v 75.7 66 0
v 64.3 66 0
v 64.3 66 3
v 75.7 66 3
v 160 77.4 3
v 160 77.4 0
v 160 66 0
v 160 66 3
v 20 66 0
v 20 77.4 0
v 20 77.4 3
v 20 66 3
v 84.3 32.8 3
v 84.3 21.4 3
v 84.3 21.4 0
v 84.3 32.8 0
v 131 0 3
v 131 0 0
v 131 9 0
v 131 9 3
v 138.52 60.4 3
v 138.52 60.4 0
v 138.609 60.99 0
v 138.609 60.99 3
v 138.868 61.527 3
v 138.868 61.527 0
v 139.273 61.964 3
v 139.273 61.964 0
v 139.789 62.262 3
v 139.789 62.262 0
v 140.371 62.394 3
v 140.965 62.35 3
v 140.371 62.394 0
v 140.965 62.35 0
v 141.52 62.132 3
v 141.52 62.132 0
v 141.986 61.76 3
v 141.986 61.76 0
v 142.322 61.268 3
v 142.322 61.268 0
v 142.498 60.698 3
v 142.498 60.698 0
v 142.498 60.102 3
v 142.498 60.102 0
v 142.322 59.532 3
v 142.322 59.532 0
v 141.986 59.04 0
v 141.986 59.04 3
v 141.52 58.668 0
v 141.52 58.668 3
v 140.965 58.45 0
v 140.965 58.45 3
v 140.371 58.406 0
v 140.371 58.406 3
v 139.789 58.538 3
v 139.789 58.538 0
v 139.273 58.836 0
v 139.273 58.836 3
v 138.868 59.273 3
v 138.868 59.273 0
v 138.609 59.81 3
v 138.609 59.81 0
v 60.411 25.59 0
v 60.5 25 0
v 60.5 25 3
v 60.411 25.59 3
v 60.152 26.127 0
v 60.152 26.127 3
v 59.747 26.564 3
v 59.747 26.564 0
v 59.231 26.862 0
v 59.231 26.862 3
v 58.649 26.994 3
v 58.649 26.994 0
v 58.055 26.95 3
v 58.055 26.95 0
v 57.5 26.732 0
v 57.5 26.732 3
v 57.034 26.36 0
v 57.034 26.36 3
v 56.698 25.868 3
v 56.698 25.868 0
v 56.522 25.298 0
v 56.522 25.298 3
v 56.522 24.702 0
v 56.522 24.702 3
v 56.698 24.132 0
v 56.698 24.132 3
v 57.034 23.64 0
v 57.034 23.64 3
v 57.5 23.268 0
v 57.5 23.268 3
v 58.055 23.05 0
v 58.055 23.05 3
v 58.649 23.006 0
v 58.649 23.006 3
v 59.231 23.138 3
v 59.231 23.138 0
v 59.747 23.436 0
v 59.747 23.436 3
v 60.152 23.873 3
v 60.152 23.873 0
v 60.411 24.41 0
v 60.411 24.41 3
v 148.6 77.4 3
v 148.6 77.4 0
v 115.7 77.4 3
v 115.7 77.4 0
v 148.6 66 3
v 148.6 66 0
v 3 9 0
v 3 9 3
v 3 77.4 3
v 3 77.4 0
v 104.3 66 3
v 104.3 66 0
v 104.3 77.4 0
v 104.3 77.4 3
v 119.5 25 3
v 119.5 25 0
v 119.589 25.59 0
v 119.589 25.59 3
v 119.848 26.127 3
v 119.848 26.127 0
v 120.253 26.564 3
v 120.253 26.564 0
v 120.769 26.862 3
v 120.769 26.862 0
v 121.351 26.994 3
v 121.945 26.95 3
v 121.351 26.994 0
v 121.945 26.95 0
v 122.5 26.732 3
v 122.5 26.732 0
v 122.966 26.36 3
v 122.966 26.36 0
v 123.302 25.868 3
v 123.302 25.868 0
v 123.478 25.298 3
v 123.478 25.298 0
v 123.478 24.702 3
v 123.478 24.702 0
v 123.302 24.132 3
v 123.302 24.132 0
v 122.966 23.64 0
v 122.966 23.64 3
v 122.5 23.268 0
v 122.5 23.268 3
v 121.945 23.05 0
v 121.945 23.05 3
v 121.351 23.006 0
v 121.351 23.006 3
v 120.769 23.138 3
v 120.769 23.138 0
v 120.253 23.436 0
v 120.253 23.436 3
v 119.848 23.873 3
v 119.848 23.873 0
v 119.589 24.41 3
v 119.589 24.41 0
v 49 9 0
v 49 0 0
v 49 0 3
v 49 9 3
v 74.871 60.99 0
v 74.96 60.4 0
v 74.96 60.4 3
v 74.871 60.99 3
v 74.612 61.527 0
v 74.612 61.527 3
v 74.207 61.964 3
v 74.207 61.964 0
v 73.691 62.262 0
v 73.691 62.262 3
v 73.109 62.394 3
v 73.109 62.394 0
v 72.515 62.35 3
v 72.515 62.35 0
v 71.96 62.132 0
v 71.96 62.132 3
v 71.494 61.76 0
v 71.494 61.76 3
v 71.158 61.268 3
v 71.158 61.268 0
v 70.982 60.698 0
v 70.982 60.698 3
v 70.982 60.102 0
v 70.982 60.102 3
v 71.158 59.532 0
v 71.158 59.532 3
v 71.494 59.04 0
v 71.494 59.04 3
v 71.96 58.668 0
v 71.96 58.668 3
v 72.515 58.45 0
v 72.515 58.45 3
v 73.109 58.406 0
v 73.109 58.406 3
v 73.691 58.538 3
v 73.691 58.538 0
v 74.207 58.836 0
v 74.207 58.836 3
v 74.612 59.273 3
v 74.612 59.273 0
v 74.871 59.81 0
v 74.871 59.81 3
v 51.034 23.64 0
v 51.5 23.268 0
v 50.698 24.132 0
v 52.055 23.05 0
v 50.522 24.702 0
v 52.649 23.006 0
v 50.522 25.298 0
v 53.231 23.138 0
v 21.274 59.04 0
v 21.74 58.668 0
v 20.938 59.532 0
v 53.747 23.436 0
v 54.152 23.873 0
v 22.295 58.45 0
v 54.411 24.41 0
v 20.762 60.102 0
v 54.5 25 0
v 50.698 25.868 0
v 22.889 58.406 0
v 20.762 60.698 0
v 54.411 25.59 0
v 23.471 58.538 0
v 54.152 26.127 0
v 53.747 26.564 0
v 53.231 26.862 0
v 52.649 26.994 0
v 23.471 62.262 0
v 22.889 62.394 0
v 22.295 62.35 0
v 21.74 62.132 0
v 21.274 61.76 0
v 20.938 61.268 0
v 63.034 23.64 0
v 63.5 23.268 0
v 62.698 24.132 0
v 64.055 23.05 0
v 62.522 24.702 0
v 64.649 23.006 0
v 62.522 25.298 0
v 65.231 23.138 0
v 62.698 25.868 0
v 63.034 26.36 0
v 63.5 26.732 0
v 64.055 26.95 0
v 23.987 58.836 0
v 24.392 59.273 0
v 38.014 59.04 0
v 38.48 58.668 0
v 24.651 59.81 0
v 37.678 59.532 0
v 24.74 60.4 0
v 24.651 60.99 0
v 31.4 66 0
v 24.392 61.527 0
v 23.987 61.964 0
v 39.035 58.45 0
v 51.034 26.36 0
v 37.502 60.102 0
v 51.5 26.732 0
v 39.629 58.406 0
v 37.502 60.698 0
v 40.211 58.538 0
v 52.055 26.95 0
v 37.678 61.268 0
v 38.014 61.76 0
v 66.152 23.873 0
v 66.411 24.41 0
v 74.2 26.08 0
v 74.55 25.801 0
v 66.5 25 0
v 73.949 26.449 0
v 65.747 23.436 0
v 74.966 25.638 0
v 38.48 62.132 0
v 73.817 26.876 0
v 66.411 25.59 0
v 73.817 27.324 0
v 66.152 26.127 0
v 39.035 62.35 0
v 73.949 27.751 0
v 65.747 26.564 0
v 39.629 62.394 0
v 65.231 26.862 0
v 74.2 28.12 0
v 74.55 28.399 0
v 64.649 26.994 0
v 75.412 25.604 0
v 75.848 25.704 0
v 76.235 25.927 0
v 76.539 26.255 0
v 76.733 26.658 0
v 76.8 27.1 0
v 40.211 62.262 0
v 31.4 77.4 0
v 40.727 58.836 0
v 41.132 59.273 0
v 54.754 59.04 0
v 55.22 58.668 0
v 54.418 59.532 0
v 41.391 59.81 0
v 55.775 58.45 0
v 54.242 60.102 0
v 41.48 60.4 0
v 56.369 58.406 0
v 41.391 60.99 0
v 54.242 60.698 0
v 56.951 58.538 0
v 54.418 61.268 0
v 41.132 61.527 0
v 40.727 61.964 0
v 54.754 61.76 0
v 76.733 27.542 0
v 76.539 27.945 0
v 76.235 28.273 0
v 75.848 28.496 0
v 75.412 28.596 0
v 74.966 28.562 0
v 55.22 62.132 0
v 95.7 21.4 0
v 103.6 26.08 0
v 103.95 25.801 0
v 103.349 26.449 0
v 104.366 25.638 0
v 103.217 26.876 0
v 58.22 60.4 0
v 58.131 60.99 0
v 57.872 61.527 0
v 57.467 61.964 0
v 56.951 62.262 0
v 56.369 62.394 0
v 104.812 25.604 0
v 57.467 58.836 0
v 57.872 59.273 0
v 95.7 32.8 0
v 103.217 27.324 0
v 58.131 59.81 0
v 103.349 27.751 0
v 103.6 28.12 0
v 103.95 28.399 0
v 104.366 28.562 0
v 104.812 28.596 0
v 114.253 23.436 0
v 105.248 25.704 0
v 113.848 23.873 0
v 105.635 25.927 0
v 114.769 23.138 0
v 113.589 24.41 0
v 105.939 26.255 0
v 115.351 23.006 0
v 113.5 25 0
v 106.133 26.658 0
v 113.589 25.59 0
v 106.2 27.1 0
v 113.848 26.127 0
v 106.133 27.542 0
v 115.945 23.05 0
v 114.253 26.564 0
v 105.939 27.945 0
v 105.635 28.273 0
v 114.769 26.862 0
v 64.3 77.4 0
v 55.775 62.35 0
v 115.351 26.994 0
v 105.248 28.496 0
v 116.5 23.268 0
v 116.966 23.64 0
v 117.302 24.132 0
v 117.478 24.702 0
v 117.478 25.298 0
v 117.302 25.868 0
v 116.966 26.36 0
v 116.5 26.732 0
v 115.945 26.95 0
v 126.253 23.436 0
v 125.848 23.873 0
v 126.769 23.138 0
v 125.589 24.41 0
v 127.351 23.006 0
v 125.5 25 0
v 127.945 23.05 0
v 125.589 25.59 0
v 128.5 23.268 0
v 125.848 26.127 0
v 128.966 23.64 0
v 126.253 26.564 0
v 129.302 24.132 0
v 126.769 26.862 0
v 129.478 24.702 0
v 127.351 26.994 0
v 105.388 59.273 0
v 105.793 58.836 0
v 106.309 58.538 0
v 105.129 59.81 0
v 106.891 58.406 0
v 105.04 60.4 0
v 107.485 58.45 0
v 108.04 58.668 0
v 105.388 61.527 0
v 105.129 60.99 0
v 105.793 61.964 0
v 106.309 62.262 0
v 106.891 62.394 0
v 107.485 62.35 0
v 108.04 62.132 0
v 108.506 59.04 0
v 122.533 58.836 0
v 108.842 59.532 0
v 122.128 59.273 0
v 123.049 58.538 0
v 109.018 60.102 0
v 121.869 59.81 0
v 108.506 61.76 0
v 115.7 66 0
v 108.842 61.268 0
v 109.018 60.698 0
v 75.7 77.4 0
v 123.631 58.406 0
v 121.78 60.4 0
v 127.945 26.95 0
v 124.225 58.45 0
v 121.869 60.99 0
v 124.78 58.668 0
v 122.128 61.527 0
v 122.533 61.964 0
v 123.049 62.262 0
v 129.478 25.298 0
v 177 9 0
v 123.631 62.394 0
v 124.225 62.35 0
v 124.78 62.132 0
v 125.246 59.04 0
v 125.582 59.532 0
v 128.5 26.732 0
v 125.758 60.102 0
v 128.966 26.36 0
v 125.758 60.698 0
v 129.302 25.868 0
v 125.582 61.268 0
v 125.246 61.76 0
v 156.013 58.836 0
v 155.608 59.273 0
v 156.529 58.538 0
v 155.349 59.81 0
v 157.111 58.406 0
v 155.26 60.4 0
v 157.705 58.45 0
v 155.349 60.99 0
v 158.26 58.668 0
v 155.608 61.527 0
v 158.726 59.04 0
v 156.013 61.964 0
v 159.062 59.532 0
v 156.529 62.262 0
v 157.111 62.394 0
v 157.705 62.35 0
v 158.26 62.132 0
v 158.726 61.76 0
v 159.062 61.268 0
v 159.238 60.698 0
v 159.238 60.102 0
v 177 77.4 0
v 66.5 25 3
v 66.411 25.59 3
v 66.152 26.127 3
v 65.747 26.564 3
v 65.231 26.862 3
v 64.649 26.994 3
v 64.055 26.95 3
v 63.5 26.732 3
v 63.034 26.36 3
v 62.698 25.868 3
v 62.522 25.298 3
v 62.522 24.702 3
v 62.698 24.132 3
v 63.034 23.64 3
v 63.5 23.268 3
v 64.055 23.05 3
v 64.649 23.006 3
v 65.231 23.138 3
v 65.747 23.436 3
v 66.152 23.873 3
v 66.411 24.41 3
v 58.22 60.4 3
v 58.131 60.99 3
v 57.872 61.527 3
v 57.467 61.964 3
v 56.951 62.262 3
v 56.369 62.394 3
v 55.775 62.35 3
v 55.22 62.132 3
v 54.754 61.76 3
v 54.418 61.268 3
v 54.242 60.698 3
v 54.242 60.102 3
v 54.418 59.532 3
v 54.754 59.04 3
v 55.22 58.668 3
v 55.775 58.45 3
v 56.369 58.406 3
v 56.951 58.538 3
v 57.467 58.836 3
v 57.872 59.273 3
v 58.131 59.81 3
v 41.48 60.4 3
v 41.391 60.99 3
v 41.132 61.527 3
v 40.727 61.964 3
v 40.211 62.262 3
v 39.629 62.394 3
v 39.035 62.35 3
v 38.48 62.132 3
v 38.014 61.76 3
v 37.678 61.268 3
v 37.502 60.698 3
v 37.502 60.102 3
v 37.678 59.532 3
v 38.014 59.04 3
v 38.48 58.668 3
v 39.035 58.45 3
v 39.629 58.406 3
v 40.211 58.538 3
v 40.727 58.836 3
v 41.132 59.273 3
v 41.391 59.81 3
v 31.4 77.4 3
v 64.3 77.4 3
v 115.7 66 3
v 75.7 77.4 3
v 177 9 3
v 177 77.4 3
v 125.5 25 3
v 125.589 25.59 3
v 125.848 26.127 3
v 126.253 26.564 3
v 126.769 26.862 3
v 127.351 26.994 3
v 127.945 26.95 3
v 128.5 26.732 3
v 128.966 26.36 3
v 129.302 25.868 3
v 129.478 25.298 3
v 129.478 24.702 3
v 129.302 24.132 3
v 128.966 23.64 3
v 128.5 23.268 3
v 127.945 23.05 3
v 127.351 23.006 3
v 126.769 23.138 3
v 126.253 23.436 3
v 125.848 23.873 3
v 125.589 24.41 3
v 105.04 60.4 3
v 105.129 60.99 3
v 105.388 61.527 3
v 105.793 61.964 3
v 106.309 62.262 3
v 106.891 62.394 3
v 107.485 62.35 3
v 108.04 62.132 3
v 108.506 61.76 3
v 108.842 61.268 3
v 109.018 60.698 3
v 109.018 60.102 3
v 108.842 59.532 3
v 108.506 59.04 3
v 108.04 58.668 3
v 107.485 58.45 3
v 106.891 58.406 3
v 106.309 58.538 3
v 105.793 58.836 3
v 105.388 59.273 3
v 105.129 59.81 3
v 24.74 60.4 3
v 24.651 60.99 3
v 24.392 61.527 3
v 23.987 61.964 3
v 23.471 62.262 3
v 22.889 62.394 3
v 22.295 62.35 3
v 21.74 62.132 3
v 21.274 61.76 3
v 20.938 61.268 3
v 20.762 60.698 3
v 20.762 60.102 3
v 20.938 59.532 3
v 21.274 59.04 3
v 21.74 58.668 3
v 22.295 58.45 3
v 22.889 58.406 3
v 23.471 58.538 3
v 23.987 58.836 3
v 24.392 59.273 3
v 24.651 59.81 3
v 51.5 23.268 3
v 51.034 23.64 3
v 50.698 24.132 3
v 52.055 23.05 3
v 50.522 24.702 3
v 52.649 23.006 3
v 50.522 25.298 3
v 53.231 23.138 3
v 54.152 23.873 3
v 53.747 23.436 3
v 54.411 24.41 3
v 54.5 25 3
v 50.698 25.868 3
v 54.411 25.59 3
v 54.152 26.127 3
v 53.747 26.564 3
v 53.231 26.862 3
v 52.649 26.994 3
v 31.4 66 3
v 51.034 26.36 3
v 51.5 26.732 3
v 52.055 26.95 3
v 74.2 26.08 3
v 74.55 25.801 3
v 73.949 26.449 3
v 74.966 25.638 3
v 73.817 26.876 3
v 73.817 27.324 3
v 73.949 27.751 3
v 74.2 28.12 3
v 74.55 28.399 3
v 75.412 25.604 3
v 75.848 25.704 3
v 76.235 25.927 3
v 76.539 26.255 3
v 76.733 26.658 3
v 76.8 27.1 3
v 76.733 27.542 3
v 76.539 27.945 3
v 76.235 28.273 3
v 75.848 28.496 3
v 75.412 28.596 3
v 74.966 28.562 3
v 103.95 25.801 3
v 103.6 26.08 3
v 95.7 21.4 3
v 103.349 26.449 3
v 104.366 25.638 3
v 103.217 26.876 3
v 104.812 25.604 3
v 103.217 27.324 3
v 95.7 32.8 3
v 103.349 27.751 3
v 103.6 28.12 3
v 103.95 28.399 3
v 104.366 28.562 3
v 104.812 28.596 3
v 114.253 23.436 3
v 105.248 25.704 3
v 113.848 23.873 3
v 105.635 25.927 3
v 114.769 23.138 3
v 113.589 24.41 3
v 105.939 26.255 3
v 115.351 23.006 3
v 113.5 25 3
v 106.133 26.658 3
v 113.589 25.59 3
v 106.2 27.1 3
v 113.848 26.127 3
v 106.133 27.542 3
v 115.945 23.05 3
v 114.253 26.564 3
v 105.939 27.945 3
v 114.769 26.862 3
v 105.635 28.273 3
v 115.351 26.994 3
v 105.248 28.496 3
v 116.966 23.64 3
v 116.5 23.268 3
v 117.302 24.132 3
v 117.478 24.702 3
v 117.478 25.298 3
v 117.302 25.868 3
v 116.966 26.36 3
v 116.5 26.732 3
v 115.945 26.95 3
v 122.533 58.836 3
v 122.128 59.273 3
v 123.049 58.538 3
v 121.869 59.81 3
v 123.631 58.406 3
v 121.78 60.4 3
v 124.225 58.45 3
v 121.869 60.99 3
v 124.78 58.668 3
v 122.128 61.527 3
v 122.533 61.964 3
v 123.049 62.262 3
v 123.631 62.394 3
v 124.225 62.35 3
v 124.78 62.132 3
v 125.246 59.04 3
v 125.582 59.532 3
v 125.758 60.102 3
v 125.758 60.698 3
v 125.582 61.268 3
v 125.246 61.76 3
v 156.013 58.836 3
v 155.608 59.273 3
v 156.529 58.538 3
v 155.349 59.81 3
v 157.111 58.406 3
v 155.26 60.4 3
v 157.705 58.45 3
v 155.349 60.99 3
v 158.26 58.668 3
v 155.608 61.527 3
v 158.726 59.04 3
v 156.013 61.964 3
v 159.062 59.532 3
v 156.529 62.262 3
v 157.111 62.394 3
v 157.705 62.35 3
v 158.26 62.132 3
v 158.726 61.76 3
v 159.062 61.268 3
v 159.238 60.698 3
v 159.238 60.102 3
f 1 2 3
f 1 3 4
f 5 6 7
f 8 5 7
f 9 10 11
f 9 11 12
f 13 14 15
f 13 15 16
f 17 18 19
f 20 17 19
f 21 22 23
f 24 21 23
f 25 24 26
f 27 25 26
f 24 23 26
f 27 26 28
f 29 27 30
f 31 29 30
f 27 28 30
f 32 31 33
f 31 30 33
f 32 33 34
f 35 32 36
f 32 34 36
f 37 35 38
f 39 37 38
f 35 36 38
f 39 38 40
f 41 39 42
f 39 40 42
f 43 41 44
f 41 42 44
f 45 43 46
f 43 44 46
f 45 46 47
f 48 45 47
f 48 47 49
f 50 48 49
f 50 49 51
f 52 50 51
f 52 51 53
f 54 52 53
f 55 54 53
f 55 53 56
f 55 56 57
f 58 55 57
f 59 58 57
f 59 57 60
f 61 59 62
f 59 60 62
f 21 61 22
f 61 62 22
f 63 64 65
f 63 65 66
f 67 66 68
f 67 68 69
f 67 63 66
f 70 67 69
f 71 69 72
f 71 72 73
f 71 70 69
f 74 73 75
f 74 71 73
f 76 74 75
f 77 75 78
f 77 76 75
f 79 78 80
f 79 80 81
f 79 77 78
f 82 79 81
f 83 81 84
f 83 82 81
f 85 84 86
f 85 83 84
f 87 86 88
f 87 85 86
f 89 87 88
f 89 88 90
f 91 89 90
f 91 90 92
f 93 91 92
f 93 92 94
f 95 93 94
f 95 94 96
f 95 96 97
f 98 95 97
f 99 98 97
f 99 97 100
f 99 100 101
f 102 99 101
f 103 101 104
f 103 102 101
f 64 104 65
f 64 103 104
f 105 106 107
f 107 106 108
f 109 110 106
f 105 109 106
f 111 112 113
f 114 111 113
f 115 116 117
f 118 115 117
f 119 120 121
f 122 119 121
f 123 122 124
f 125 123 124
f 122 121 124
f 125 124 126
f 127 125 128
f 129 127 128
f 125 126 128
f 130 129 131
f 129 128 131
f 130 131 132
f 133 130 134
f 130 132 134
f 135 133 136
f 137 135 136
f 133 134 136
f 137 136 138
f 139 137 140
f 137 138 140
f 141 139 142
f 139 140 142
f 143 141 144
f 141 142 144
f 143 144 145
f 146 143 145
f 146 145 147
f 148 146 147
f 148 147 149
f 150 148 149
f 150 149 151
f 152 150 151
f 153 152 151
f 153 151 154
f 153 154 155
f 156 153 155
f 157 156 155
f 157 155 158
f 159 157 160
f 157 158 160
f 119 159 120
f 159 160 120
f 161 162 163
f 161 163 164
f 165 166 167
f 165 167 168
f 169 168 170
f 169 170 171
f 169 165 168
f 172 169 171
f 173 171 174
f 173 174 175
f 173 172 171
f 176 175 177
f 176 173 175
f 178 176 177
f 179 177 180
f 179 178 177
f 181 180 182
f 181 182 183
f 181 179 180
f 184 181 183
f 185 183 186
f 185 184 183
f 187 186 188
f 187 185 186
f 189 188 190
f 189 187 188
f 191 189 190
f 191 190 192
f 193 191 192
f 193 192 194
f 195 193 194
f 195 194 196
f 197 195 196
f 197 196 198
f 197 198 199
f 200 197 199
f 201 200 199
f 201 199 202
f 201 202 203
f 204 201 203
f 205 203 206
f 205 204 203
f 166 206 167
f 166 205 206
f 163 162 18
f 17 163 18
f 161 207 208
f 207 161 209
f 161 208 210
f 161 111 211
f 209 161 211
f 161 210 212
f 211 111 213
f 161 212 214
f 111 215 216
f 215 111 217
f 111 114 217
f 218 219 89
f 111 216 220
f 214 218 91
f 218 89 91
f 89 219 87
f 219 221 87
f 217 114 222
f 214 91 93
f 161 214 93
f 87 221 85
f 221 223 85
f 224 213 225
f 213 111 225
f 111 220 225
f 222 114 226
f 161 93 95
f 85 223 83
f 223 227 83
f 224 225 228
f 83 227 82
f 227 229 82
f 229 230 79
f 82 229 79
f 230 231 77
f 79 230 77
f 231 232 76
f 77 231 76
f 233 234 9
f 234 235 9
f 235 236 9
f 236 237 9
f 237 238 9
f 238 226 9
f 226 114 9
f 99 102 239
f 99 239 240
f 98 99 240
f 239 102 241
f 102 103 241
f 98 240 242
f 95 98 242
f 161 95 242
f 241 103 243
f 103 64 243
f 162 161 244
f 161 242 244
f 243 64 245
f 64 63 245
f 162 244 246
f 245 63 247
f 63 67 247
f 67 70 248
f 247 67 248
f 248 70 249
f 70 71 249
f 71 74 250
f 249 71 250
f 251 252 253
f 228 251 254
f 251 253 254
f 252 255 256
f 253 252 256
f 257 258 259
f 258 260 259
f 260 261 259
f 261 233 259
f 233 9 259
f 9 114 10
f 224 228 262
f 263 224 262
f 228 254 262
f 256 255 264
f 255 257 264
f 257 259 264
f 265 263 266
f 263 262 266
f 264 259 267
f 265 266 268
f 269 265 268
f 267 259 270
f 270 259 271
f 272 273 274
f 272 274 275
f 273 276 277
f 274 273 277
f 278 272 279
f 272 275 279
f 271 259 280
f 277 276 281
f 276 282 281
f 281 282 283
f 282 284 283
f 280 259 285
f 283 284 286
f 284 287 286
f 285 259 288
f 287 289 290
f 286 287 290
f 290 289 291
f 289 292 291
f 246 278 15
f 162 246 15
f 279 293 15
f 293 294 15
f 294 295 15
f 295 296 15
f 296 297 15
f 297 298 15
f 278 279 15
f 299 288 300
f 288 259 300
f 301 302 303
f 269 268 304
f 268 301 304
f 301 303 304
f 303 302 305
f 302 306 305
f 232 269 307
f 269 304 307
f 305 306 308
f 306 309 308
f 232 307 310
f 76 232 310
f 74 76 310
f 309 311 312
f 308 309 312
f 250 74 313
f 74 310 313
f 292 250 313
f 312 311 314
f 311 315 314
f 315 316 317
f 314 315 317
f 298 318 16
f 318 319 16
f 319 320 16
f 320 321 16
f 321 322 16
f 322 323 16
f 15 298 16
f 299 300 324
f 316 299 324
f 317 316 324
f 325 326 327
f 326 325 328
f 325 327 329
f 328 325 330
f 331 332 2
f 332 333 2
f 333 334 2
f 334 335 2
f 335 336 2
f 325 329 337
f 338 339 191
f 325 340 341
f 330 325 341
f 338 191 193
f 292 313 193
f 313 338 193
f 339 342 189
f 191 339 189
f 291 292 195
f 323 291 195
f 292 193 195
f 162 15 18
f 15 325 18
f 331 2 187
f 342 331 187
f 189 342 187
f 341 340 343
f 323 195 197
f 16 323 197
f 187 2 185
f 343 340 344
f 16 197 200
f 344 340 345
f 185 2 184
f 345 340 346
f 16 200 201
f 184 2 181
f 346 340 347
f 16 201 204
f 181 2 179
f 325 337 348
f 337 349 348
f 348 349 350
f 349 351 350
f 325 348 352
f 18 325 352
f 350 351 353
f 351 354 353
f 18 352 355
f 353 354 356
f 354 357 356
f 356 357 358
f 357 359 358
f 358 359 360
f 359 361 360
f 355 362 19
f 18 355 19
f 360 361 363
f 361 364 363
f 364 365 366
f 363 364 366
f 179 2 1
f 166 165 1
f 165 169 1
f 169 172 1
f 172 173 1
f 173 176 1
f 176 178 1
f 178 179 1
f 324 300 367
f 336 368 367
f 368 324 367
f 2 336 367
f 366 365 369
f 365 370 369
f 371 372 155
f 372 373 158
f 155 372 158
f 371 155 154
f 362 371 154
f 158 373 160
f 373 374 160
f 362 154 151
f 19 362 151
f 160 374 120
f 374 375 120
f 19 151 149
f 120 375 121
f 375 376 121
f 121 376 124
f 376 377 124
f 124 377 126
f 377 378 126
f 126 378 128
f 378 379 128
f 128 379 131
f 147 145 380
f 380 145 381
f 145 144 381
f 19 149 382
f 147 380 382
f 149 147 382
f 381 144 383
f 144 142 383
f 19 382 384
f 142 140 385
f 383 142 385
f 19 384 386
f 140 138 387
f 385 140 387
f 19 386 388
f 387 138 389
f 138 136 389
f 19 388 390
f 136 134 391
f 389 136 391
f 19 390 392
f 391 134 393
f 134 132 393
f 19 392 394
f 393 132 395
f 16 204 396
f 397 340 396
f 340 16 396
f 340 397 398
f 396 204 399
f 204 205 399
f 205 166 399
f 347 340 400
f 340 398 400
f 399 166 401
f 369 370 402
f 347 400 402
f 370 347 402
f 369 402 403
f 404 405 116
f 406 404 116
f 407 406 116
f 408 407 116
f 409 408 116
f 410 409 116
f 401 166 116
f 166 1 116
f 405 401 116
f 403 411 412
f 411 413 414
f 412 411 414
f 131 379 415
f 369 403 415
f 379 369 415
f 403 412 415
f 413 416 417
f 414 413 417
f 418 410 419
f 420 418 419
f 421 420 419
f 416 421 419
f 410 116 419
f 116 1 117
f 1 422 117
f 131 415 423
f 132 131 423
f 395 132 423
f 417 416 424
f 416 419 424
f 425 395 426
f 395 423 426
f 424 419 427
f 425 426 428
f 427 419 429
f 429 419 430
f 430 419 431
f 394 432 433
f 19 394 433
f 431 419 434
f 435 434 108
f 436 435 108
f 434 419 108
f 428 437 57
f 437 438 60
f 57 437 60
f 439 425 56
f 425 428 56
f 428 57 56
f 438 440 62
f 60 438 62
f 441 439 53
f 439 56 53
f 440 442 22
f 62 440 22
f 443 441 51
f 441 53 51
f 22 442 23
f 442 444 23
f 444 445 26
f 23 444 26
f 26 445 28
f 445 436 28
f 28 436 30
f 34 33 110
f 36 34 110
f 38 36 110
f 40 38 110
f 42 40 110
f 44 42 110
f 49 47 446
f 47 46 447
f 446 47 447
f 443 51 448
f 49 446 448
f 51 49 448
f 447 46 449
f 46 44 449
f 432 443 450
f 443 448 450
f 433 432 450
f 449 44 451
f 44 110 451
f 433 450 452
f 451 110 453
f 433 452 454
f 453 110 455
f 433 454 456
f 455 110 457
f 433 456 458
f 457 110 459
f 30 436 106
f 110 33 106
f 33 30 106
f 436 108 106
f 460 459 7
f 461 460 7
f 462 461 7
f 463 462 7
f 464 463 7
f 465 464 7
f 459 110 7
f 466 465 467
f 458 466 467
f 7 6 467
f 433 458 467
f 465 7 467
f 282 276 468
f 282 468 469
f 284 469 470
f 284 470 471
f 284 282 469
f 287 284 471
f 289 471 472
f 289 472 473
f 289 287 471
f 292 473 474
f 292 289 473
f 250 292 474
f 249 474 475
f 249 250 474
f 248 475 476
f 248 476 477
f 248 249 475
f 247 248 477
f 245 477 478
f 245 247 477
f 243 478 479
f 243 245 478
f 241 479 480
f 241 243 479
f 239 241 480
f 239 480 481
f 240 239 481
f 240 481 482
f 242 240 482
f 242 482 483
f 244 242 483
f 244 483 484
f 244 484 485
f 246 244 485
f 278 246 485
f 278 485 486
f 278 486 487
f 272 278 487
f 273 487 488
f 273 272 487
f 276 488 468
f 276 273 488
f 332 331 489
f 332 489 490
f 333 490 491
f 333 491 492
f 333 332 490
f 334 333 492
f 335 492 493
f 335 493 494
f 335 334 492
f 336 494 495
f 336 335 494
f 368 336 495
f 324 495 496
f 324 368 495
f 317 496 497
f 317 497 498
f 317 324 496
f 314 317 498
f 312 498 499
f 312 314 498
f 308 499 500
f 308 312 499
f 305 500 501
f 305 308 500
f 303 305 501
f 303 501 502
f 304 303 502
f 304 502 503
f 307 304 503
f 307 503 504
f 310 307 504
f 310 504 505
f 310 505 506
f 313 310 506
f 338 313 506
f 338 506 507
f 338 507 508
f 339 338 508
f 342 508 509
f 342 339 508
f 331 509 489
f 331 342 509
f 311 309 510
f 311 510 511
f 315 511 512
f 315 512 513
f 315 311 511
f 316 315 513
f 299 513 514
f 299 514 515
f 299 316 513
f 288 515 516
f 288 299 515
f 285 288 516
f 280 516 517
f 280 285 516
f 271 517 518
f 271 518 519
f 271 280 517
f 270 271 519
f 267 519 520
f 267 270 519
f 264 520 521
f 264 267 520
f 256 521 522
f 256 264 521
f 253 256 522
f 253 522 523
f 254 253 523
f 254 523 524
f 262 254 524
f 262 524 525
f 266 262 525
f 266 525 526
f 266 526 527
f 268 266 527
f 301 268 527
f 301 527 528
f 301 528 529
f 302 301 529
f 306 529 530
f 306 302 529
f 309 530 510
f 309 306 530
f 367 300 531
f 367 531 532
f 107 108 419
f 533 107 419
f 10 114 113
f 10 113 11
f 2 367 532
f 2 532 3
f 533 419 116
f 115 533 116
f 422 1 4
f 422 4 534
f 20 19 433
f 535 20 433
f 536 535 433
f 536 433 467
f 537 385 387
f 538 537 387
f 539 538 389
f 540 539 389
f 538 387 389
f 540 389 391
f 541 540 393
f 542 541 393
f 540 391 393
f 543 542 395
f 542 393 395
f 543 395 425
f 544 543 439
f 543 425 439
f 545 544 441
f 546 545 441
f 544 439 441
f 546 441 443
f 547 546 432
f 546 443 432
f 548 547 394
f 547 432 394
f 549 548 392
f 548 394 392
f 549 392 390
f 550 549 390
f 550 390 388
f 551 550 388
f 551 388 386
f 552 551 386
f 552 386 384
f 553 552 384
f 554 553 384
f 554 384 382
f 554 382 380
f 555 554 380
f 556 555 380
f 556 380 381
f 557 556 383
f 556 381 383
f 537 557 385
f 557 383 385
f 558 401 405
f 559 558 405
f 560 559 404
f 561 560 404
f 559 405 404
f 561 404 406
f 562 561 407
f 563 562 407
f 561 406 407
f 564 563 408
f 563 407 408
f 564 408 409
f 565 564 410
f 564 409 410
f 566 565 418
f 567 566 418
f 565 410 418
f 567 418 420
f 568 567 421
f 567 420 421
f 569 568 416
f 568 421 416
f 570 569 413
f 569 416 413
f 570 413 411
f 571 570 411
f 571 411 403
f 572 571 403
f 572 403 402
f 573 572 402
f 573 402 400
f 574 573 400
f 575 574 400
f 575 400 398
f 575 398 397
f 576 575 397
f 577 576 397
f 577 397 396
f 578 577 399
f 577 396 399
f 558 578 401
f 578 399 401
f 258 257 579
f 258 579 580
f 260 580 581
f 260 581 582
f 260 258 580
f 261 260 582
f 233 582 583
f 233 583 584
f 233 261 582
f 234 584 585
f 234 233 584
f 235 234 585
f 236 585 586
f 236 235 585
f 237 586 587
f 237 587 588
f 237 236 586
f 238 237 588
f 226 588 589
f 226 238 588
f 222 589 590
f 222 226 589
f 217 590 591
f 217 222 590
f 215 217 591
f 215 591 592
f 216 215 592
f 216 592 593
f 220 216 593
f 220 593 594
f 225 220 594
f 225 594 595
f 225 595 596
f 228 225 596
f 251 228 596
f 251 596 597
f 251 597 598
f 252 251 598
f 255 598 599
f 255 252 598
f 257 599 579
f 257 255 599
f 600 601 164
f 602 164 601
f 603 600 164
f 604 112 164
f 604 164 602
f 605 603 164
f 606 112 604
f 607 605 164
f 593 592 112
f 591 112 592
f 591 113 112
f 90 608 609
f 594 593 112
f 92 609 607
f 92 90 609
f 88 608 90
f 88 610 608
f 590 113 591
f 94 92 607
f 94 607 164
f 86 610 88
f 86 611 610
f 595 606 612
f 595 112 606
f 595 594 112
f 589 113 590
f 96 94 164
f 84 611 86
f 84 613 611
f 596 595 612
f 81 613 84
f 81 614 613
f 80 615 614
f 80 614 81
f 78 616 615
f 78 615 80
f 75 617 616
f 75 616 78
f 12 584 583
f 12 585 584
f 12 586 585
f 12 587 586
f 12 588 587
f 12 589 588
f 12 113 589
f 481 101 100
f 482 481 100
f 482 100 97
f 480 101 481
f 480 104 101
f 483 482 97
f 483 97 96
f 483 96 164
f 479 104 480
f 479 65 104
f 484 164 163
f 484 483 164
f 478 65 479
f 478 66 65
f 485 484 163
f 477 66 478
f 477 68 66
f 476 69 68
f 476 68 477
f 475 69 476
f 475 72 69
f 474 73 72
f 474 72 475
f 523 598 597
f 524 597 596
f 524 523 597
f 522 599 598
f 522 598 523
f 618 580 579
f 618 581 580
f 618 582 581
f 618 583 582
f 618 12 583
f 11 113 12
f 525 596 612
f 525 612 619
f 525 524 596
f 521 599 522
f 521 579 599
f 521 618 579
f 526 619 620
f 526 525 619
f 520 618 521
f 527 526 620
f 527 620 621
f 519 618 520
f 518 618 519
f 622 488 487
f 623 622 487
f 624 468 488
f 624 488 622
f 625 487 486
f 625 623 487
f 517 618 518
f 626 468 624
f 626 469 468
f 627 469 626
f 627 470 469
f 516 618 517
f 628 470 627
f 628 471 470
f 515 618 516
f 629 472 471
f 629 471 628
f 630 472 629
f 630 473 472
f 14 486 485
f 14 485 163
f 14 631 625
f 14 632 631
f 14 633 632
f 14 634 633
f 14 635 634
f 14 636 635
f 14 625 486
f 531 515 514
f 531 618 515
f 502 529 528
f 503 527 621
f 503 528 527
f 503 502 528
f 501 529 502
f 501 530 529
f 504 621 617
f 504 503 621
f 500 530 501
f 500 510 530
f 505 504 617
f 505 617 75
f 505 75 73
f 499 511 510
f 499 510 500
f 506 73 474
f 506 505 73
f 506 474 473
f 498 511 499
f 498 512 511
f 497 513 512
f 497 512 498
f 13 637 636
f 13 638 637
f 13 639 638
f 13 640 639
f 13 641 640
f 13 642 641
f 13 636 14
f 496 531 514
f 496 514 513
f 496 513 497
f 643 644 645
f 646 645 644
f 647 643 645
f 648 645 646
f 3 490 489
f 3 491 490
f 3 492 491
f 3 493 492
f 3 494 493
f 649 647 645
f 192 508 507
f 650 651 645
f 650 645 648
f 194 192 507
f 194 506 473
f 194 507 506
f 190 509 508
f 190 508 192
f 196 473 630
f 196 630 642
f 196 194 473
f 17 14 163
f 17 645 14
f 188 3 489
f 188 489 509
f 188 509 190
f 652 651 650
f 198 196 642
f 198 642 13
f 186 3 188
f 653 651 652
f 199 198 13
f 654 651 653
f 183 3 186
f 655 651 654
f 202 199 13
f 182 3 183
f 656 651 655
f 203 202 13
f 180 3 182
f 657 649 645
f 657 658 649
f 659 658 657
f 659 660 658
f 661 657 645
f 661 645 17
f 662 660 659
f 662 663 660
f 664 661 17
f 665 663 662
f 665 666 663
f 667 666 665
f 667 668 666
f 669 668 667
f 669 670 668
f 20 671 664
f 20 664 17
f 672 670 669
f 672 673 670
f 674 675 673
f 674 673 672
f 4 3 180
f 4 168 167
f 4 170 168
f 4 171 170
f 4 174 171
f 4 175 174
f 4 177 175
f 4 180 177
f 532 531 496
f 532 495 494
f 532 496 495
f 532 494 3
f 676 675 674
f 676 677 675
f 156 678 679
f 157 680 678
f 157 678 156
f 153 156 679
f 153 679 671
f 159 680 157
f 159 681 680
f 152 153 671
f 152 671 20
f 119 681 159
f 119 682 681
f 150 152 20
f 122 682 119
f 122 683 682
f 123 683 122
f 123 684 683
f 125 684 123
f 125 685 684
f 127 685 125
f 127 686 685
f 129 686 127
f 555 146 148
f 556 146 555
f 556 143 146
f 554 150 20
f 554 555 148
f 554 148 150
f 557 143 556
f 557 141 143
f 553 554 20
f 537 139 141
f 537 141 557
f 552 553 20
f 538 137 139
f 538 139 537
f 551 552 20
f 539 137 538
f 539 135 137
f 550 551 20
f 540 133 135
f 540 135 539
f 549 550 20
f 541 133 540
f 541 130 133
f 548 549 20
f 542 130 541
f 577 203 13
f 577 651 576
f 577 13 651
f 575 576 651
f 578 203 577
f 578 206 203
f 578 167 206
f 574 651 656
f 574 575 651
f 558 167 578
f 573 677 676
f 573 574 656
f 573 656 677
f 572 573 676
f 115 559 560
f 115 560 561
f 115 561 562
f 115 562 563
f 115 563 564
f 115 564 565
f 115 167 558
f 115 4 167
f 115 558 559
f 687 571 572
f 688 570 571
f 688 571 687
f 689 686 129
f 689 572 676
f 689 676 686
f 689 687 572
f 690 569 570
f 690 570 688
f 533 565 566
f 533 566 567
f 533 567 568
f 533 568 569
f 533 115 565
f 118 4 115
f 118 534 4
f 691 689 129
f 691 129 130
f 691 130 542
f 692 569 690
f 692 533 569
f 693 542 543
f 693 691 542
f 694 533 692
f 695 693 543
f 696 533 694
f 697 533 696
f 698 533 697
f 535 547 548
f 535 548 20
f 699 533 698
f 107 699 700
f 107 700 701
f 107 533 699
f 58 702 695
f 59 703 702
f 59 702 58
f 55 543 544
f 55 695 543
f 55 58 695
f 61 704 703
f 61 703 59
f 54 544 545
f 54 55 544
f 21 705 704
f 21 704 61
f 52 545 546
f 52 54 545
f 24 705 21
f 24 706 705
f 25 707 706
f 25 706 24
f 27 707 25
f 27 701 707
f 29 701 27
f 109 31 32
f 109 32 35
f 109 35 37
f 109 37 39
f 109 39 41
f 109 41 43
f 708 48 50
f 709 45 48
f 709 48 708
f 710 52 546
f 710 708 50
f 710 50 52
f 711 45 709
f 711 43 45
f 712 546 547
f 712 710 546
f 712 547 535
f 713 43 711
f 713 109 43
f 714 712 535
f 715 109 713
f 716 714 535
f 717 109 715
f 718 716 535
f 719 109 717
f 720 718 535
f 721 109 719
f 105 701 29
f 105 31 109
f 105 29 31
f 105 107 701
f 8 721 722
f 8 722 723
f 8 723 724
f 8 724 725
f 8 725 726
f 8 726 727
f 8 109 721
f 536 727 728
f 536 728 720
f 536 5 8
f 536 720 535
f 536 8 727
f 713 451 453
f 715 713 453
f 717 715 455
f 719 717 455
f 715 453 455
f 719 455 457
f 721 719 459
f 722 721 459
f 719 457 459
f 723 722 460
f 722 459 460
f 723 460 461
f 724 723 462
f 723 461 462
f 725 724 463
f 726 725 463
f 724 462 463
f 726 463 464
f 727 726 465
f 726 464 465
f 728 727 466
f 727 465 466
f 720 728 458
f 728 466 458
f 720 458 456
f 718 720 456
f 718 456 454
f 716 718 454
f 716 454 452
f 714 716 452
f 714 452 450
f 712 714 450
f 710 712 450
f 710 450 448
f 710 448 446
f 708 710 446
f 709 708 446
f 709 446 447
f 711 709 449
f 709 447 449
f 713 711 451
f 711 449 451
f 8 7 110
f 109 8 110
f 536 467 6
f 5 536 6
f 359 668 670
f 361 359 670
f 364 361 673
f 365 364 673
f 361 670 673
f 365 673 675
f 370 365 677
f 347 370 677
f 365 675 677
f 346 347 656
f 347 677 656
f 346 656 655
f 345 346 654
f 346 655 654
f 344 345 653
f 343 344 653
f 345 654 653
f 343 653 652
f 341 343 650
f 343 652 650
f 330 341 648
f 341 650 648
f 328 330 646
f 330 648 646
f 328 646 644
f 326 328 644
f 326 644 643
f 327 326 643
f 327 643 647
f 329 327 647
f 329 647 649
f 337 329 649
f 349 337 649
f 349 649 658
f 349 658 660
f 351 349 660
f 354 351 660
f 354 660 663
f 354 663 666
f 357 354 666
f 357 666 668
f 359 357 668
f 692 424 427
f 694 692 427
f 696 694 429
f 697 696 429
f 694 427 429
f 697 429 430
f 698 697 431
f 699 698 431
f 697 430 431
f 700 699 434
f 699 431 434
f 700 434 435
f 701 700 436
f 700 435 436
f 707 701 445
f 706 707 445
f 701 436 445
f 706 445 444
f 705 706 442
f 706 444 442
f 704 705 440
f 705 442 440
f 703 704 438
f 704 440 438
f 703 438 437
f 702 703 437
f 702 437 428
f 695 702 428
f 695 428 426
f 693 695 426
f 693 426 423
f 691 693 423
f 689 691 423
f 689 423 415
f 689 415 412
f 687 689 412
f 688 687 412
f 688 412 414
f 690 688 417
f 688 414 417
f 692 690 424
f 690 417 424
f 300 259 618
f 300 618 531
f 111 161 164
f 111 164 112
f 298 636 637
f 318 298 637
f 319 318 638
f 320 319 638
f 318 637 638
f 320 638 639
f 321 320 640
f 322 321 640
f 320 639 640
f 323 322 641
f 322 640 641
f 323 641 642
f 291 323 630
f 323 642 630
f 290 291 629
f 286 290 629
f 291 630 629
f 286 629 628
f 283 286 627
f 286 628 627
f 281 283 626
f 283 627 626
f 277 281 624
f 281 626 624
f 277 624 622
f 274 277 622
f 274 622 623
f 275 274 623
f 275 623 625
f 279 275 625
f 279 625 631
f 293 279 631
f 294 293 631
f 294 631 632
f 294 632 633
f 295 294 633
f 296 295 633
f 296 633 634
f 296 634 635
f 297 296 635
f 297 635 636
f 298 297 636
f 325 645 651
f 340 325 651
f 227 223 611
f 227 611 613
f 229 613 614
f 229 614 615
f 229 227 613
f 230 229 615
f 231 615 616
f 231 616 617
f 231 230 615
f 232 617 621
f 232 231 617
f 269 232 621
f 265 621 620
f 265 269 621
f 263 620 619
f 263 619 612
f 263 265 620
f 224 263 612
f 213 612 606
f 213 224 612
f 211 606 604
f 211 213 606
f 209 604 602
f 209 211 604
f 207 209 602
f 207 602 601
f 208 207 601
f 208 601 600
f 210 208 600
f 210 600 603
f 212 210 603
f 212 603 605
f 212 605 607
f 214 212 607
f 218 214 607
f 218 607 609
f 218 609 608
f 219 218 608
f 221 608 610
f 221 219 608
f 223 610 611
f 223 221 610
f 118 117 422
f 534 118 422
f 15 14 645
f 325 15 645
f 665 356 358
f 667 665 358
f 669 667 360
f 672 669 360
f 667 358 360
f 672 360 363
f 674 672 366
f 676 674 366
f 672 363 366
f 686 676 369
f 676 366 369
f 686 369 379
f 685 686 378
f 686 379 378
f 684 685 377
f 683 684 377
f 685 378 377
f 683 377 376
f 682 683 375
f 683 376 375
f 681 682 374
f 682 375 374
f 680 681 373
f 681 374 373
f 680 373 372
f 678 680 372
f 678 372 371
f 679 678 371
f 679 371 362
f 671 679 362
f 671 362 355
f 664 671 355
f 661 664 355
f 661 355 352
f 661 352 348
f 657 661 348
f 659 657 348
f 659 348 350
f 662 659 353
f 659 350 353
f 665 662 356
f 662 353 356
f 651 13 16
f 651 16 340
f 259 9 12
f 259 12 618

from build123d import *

# Parameters (mm, degrees)
SKETCH_R      = 2
PAD_DEPTH     = 3
SKETCH001_R   = 1.5
SKETCH001_W   = 3
SKETCH001_H   = 90.076996
SKETCH001_H_2 = 90.92247
SKETCH001_W_2 = 11.4
SKETCH001_H_3 = 11.4
POCKET_DEPTH  = 3.001


with BuildPart() as part:
    # Sketch → Pad (new body)
    with BuildSketch(Plane.XY):
        Polygon((0, 77.4), (20, 77.4), (20, 66), (31.4, 66), (31.4, 77.4), (64.3, 77.4), (64.3, 66), (75.7, 66), (75.7, 77.4), (90, 77.4), (90, 0), (49, 0), (49, 9), (0, 9), align=None)
        with Locations((52.5, 25)):
            Circle(SKETCH_R, mode=Mode.SUBTRACT)
        with Locations((58.5, 25)):
            Circle(SKETCH_R, mode=Mode.SUBTRACT)
        with Locations((64.5, 25)):
            Circle(SKETCH_R, mode=Mode.SUBTRACT)
        with Locations((22.74, 60.4)):
            Circle(SKETCH_R, mode=Mode.SUBTRACT)
        with Locations((39.48, 60.4)):
            Circle(SKETCH_R, mode=Mode.SUBTRACT)
        with Locations((56.22, 60.4)):
            Circle(SKETCH_R, mode=Mode.SUBTRACT)
        with Locations((72.96, 60.4)):
            Circle(SKETCH_R, mode=Mode.SUBTRACT)
    pad = extrude(amount=PAD_DEPTH)

    # Mirrored: Pad across face of Pad
    add(pad.mirror(Plane(origin=(90, 38.7, 1.5), x_dir=(0, 1, 0), z_dir=(1, 0, 0))))

    # Sketch001 → Pocket (cut, through all)
    with BuildSketch(Plane.XY.offset(3)):
        with Locations((104.7, 27.1)):
            Circle(SKETCH001_R)
        with Locations((75.3, 27.1)):
            Circle(SKETCH001_R)
        with Locations((1.5, 45.038498)):
            Rectangle(SKETCH001_W, SKETCH001_H)
        with Locations((178.5, 45.461235)):
            Rectangle(SKETCH001_W, SKETCH001_H_2)
        with Locations((90, 27.1)):
            Rectangle(SKETCH001_W_2, SKETCH001_H_3)
    extrude(amount=-POCKET_DEPTH, mode=Mode.SUBTRACT)


solid = part.part
